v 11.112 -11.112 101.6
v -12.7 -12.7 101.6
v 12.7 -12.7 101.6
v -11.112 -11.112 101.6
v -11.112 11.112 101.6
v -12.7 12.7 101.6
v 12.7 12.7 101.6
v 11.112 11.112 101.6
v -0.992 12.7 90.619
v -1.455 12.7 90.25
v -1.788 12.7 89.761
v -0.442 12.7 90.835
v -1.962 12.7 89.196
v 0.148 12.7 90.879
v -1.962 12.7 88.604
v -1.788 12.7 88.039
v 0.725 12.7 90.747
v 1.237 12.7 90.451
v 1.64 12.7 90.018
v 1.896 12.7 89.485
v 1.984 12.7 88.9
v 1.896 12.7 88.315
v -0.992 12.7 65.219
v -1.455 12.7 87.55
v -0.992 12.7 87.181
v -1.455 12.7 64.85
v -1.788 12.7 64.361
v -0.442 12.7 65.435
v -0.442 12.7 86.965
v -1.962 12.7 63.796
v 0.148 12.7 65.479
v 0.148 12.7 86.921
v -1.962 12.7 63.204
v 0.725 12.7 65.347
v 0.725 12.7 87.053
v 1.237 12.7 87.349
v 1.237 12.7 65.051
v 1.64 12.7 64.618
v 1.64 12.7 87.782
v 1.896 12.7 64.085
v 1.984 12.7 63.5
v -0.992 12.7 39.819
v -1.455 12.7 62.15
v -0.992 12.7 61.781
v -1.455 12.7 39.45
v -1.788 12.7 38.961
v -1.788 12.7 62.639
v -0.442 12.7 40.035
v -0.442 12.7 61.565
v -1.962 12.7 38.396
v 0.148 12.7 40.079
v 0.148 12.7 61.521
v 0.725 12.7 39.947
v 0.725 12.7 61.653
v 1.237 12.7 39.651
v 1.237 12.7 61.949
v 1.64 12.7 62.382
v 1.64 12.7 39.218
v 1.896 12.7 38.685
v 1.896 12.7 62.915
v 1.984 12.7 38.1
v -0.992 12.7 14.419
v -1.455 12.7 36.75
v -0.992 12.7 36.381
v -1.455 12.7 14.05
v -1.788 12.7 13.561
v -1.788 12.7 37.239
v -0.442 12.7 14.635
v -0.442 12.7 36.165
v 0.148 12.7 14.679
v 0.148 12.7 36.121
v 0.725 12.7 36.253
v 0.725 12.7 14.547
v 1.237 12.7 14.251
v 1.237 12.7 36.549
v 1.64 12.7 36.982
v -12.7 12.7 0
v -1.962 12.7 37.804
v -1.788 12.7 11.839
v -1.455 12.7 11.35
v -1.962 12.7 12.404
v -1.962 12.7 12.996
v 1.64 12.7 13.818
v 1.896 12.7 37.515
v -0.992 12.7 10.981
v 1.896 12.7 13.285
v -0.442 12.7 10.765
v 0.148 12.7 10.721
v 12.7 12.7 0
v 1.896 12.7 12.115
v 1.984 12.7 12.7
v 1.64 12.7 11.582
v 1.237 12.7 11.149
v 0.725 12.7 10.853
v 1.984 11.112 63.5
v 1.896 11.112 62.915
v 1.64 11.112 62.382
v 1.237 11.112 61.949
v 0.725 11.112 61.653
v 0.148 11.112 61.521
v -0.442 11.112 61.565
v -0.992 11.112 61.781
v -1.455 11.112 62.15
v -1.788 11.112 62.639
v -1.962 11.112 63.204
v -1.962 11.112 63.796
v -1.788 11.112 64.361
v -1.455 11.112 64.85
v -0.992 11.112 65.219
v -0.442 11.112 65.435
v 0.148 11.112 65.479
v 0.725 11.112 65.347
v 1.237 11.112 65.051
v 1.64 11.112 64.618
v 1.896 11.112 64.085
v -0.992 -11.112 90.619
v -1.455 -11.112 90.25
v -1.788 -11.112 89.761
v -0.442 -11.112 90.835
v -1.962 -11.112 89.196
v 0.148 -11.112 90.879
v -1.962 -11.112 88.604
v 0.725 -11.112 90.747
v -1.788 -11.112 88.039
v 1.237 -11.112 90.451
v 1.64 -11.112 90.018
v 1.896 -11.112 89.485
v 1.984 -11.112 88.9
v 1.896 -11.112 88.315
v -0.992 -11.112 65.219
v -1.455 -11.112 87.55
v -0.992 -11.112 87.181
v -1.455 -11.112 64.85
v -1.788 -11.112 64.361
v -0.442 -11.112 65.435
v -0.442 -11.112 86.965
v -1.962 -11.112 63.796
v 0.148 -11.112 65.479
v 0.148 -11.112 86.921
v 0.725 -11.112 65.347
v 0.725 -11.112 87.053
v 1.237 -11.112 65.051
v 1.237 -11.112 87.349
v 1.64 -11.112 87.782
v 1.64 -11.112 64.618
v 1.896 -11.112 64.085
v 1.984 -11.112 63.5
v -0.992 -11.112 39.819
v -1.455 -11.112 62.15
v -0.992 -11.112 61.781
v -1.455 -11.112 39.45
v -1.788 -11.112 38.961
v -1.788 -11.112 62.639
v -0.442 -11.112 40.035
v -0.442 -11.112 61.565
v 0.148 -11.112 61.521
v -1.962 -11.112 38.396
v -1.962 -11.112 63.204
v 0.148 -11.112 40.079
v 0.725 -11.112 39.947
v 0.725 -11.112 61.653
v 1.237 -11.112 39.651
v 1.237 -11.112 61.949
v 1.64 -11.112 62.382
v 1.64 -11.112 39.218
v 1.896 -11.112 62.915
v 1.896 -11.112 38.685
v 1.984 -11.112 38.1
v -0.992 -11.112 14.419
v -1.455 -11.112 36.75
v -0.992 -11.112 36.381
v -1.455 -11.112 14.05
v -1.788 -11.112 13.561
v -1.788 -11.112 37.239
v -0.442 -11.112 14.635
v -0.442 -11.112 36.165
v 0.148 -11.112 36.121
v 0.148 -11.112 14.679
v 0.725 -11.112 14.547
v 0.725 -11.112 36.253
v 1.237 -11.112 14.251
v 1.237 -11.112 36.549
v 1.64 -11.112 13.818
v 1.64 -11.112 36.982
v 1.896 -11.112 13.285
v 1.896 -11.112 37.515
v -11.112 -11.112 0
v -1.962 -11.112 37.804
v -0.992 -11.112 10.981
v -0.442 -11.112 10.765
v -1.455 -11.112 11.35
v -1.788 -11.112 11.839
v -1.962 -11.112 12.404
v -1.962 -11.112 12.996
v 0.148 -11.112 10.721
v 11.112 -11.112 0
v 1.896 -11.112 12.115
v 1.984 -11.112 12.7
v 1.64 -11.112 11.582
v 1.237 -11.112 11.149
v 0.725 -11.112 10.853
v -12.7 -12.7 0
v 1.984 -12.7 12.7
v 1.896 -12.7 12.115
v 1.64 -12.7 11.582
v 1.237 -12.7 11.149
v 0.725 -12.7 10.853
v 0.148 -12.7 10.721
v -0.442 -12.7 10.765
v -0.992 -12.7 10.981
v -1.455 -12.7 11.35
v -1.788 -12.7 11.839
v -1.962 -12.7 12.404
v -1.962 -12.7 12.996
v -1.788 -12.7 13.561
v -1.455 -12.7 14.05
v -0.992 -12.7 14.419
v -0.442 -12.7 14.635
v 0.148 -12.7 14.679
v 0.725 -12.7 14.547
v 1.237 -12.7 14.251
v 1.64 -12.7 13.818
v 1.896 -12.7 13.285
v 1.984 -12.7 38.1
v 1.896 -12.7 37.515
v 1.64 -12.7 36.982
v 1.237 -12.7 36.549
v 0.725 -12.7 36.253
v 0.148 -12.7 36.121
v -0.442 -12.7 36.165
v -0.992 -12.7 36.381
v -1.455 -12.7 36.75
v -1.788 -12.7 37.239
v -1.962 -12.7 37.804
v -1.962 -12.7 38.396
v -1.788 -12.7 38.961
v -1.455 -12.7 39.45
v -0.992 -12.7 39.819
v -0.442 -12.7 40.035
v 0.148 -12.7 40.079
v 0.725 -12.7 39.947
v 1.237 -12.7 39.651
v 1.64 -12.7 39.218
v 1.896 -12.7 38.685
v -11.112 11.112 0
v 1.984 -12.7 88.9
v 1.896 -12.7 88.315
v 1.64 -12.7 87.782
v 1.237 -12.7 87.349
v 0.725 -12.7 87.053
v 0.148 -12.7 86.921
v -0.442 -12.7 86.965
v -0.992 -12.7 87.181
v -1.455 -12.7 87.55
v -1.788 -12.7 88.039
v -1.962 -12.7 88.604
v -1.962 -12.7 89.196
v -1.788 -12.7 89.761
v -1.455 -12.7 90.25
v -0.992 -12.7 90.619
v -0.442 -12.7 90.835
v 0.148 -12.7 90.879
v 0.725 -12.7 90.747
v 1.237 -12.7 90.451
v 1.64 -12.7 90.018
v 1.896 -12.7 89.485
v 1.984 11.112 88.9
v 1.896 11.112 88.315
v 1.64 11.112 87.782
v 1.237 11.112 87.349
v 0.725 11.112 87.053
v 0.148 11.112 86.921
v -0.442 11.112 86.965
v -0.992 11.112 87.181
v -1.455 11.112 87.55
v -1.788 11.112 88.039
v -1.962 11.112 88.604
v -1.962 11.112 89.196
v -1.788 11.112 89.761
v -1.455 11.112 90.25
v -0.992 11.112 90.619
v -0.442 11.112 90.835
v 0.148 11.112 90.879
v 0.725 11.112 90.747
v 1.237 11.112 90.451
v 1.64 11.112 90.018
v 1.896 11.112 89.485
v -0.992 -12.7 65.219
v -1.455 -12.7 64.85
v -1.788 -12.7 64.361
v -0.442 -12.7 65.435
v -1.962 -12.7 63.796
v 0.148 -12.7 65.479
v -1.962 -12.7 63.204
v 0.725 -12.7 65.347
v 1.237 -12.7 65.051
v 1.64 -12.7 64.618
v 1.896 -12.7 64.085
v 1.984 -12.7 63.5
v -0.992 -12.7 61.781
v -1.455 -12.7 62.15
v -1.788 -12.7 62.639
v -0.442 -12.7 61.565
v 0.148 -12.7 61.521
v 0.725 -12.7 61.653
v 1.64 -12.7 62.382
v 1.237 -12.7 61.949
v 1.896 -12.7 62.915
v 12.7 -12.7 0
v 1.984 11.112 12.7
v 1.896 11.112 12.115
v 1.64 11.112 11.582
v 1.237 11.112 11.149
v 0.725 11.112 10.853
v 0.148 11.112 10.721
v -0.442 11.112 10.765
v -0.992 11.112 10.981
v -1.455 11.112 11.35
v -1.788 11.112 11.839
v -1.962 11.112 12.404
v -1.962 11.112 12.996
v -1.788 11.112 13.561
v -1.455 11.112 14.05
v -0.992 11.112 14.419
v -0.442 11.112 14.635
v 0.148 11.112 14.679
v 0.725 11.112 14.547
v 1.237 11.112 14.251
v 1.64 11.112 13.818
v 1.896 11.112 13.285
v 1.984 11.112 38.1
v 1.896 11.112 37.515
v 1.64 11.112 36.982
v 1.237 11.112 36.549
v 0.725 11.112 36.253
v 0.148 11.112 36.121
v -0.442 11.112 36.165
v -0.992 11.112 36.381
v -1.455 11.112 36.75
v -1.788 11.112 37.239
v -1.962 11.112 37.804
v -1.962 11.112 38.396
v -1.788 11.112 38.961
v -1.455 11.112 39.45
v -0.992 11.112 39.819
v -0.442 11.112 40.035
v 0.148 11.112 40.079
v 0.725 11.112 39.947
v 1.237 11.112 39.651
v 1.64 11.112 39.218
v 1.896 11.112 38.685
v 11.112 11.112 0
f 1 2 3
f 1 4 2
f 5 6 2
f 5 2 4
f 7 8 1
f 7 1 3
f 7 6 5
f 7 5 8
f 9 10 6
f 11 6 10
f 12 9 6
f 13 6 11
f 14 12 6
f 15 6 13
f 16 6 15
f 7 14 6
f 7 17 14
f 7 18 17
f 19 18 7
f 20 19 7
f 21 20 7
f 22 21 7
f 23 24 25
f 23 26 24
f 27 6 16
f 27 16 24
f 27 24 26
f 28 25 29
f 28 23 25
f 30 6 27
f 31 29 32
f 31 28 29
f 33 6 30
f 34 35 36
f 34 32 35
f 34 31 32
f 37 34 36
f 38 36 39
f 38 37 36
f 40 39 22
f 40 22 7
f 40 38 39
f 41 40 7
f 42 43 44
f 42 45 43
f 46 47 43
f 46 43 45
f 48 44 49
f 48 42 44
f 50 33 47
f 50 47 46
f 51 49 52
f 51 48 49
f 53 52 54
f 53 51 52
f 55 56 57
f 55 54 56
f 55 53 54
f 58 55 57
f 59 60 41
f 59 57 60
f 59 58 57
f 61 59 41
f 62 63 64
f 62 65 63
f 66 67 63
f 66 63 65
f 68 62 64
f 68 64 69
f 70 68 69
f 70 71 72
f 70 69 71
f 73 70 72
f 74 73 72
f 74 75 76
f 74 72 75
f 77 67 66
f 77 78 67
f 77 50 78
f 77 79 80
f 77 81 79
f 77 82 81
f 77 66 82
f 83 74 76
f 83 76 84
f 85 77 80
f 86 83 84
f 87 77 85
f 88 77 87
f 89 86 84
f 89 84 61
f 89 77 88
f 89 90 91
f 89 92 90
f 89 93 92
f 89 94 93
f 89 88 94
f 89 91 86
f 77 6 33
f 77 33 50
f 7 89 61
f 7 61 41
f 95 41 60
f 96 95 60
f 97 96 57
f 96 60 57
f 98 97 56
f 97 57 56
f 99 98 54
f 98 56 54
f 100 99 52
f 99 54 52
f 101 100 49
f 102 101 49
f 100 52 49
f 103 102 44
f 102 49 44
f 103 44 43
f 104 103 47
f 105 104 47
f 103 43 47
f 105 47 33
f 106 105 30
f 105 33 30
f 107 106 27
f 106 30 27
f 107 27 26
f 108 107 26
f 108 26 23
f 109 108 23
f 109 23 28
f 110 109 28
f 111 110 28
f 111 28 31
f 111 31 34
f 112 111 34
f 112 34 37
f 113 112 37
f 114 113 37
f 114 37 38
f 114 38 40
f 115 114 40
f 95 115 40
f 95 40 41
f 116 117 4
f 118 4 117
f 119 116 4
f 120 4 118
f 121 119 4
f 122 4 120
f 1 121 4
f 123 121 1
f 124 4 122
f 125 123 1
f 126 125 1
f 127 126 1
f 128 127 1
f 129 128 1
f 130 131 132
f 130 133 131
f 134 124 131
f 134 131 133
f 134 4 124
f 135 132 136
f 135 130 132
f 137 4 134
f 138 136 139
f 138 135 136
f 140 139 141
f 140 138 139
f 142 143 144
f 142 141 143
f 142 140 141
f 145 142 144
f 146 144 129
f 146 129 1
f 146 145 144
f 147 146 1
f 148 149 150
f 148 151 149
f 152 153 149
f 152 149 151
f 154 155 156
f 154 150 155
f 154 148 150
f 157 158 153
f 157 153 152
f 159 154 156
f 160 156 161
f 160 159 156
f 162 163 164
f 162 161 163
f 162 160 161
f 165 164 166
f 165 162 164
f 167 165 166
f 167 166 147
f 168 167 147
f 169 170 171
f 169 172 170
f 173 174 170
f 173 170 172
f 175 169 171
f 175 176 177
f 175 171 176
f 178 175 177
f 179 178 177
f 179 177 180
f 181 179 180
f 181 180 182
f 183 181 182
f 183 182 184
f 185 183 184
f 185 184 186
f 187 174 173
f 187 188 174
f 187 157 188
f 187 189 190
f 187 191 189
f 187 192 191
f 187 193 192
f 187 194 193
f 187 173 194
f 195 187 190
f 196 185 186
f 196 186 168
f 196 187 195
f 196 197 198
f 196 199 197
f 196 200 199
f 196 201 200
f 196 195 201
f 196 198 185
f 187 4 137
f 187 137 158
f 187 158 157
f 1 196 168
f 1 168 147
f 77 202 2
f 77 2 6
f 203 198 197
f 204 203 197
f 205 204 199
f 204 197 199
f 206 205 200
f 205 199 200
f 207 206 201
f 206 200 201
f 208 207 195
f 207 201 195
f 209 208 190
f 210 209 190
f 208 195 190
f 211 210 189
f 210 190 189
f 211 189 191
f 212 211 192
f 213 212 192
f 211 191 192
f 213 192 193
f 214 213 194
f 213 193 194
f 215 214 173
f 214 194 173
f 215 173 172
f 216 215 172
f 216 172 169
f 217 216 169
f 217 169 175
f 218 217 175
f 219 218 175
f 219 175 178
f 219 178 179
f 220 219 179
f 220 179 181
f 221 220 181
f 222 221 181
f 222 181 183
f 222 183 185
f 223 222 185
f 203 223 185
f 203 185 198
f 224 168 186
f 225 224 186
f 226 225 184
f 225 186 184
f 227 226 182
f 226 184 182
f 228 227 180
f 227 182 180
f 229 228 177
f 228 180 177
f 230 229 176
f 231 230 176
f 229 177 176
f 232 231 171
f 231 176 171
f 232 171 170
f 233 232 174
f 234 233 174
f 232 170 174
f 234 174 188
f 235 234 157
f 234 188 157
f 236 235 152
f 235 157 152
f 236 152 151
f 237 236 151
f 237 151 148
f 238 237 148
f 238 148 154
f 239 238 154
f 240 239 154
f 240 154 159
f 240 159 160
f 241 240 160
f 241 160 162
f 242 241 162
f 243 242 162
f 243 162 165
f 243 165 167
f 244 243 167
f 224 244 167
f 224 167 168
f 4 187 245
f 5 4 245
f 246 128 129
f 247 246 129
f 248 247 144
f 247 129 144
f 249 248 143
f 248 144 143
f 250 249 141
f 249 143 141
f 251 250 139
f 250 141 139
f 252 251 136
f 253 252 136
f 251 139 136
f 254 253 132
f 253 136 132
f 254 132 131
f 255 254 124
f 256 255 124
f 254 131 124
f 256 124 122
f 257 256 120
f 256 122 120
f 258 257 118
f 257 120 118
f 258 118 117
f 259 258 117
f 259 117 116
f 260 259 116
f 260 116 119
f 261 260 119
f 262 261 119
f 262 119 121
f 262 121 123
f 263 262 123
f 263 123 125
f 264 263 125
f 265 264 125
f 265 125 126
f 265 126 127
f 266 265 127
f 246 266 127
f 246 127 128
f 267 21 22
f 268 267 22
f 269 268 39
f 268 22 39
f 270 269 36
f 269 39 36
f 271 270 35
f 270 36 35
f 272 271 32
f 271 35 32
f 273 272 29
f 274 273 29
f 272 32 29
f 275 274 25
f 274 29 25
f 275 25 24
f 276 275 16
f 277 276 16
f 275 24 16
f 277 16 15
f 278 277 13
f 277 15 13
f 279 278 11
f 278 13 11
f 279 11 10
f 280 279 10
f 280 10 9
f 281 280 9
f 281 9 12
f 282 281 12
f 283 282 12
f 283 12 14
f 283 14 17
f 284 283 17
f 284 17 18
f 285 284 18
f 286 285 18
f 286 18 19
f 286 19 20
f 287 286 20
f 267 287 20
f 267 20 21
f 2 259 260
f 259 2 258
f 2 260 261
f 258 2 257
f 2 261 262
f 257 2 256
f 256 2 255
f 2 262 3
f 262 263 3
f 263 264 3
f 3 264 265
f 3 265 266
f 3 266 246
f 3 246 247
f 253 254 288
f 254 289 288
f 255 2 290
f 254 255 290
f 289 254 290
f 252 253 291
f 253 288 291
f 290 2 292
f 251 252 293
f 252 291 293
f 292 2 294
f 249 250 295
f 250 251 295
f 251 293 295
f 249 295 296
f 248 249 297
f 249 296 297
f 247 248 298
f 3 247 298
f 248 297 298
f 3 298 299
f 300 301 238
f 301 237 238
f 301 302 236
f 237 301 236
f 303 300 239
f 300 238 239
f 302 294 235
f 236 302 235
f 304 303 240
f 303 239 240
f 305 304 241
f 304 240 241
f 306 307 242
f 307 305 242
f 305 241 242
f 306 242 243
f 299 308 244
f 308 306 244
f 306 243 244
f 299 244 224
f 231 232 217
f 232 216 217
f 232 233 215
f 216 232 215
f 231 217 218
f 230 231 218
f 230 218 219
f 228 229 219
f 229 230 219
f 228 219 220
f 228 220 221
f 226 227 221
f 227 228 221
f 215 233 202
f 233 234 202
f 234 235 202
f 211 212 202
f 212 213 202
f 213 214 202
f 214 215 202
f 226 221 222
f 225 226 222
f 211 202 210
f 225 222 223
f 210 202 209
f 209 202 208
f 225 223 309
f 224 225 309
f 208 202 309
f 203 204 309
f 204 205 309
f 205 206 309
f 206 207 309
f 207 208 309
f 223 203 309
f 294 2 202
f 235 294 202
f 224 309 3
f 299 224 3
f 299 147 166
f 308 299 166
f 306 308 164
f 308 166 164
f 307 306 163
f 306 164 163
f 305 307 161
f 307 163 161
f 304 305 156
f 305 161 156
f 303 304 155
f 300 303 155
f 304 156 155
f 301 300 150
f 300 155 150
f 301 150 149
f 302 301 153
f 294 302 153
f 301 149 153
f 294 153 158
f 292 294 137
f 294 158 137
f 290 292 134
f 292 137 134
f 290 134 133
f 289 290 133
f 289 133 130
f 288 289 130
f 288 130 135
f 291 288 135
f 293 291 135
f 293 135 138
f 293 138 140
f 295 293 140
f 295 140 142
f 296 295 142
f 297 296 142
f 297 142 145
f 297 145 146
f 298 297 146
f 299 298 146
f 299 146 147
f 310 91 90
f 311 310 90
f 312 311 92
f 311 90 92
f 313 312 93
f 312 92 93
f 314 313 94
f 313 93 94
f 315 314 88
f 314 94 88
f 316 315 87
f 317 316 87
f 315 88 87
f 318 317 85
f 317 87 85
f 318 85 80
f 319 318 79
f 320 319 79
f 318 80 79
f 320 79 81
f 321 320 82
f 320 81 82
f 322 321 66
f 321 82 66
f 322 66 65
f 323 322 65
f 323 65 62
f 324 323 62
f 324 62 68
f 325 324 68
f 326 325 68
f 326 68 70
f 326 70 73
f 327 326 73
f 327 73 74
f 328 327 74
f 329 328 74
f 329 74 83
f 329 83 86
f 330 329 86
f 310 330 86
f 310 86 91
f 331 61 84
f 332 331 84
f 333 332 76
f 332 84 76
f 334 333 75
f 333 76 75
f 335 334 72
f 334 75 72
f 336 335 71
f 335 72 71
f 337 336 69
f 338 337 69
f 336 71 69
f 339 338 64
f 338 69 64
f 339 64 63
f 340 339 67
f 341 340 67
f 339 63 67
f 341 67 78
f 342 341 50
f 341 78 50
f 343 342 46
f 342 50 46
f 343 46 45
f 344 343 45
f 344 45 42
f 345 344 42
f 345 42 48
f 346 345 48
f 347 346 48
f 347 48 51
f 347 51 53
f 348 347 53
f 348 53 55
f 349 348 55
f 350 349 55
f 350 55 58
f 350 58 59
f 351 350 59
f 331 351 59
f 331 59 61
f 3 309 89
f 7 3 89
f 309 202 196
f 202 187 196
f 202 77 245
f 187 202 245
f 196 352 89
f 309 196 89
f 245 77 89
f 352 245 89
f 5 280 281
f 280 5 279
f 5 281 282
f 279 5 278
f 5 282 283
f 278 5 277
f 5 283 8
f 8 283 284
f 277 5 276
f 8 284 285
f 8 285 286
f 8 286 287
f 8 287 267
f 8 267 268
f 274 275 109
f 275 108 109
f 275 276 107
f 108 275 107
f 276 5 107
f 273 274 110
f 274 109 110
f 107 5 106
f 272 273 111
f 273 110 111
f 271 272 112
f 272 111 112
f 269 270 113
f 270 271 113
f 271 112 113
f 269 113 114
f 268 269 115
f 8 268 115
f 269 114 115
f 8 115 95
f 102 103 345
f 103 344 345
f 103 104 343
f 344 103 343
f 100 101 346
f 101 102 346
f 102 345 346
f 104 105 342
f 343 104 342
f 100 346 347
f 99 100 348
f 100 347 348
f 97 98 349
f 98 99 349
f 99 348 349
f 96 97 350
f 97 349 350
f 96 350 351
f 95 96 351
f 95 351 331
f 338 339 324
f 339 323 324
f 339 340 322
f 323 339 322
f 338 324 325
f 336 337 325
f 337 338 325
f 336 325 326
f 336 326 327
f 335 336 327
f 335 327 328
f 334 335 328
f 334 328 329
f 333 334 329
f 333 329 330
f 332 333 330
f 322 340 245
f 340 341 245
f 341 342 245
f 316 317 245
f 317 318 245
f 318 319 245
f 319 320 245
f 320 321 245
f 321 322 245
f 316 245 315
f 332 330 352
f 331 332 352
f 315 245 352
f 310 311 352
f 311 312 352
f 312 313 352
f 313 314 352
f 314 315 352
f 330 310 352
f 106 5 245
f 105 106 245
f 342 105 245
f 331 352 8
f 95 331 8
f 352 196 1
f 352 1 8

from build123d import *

# Parameters (mm, degrees)
SKETCH1_W           = 25.4
SKETCH1_H           = 25.4
SKETCH1_W_2         = 22.225
SKETCH1_H_2         = 22.225
BOSS_EXTRUDE1_DEPTH = 101.6
SKETCH2_R           = 1.984375
CUT_EXTRUDE1_DEPTH  = 26.4


with BuildPart() as part:
    # Sketch1 → Boss-Extrude1 (new body)
    with BuildSketch(Plane.XY):
        Rectangle(SKETCH1_W, SKETCH1_H)
        Rectangle(SKETCH1_W_2, SKETCH1_H_2, mode=Mode.SUBTRACT)
    extrude(amount=BOSS_EXTRUDE1_DEPTH)

    # Sketch2 → Cut-Extrude1 (cut, through all)
    with BuildSketch(Plane(origin=(0, 12.7, 0), x_dir=(1, 0, 0), z_dir=(0, 1, 0))):
        with Locations((0, -88.9)):
            Circle(SKETCH2_R)
        with Locations((0, -63.5)):
            Circle(SKETCH2_R)
        with Locations((0, -38.1)):
            Circle(SKETCH2_R)
        with Locations((0, -12.7)):
            Circle(SKETCH2_R)
        with Locations((0, 12.7)):
            Circle(SKETCH2_R)
        with Locations((0, 38.1)):
            Circle(SKETCH2_R)
        with Locations((0, 63.5)):
            Circle(SKETCH2_R)
        with Locations((0, 88.9)):
            Circle(SKETCH2_R)
        with Locations((0, 114.3)):
            Circle(SKETCH2_R)
        with Locations((0, 139.7)):
            Circle(SKETCH2_R)
        with Locations((0, 165.1)):
            Circle(SKETCH2_R)
        with Locations((0, 190.5)):
            Circle(SKETCH2_R)
    extrude(amount=-CUT_EXTRUDE1_DEPTH, mode=Mode.SUBTRACT)


solid = part.part
